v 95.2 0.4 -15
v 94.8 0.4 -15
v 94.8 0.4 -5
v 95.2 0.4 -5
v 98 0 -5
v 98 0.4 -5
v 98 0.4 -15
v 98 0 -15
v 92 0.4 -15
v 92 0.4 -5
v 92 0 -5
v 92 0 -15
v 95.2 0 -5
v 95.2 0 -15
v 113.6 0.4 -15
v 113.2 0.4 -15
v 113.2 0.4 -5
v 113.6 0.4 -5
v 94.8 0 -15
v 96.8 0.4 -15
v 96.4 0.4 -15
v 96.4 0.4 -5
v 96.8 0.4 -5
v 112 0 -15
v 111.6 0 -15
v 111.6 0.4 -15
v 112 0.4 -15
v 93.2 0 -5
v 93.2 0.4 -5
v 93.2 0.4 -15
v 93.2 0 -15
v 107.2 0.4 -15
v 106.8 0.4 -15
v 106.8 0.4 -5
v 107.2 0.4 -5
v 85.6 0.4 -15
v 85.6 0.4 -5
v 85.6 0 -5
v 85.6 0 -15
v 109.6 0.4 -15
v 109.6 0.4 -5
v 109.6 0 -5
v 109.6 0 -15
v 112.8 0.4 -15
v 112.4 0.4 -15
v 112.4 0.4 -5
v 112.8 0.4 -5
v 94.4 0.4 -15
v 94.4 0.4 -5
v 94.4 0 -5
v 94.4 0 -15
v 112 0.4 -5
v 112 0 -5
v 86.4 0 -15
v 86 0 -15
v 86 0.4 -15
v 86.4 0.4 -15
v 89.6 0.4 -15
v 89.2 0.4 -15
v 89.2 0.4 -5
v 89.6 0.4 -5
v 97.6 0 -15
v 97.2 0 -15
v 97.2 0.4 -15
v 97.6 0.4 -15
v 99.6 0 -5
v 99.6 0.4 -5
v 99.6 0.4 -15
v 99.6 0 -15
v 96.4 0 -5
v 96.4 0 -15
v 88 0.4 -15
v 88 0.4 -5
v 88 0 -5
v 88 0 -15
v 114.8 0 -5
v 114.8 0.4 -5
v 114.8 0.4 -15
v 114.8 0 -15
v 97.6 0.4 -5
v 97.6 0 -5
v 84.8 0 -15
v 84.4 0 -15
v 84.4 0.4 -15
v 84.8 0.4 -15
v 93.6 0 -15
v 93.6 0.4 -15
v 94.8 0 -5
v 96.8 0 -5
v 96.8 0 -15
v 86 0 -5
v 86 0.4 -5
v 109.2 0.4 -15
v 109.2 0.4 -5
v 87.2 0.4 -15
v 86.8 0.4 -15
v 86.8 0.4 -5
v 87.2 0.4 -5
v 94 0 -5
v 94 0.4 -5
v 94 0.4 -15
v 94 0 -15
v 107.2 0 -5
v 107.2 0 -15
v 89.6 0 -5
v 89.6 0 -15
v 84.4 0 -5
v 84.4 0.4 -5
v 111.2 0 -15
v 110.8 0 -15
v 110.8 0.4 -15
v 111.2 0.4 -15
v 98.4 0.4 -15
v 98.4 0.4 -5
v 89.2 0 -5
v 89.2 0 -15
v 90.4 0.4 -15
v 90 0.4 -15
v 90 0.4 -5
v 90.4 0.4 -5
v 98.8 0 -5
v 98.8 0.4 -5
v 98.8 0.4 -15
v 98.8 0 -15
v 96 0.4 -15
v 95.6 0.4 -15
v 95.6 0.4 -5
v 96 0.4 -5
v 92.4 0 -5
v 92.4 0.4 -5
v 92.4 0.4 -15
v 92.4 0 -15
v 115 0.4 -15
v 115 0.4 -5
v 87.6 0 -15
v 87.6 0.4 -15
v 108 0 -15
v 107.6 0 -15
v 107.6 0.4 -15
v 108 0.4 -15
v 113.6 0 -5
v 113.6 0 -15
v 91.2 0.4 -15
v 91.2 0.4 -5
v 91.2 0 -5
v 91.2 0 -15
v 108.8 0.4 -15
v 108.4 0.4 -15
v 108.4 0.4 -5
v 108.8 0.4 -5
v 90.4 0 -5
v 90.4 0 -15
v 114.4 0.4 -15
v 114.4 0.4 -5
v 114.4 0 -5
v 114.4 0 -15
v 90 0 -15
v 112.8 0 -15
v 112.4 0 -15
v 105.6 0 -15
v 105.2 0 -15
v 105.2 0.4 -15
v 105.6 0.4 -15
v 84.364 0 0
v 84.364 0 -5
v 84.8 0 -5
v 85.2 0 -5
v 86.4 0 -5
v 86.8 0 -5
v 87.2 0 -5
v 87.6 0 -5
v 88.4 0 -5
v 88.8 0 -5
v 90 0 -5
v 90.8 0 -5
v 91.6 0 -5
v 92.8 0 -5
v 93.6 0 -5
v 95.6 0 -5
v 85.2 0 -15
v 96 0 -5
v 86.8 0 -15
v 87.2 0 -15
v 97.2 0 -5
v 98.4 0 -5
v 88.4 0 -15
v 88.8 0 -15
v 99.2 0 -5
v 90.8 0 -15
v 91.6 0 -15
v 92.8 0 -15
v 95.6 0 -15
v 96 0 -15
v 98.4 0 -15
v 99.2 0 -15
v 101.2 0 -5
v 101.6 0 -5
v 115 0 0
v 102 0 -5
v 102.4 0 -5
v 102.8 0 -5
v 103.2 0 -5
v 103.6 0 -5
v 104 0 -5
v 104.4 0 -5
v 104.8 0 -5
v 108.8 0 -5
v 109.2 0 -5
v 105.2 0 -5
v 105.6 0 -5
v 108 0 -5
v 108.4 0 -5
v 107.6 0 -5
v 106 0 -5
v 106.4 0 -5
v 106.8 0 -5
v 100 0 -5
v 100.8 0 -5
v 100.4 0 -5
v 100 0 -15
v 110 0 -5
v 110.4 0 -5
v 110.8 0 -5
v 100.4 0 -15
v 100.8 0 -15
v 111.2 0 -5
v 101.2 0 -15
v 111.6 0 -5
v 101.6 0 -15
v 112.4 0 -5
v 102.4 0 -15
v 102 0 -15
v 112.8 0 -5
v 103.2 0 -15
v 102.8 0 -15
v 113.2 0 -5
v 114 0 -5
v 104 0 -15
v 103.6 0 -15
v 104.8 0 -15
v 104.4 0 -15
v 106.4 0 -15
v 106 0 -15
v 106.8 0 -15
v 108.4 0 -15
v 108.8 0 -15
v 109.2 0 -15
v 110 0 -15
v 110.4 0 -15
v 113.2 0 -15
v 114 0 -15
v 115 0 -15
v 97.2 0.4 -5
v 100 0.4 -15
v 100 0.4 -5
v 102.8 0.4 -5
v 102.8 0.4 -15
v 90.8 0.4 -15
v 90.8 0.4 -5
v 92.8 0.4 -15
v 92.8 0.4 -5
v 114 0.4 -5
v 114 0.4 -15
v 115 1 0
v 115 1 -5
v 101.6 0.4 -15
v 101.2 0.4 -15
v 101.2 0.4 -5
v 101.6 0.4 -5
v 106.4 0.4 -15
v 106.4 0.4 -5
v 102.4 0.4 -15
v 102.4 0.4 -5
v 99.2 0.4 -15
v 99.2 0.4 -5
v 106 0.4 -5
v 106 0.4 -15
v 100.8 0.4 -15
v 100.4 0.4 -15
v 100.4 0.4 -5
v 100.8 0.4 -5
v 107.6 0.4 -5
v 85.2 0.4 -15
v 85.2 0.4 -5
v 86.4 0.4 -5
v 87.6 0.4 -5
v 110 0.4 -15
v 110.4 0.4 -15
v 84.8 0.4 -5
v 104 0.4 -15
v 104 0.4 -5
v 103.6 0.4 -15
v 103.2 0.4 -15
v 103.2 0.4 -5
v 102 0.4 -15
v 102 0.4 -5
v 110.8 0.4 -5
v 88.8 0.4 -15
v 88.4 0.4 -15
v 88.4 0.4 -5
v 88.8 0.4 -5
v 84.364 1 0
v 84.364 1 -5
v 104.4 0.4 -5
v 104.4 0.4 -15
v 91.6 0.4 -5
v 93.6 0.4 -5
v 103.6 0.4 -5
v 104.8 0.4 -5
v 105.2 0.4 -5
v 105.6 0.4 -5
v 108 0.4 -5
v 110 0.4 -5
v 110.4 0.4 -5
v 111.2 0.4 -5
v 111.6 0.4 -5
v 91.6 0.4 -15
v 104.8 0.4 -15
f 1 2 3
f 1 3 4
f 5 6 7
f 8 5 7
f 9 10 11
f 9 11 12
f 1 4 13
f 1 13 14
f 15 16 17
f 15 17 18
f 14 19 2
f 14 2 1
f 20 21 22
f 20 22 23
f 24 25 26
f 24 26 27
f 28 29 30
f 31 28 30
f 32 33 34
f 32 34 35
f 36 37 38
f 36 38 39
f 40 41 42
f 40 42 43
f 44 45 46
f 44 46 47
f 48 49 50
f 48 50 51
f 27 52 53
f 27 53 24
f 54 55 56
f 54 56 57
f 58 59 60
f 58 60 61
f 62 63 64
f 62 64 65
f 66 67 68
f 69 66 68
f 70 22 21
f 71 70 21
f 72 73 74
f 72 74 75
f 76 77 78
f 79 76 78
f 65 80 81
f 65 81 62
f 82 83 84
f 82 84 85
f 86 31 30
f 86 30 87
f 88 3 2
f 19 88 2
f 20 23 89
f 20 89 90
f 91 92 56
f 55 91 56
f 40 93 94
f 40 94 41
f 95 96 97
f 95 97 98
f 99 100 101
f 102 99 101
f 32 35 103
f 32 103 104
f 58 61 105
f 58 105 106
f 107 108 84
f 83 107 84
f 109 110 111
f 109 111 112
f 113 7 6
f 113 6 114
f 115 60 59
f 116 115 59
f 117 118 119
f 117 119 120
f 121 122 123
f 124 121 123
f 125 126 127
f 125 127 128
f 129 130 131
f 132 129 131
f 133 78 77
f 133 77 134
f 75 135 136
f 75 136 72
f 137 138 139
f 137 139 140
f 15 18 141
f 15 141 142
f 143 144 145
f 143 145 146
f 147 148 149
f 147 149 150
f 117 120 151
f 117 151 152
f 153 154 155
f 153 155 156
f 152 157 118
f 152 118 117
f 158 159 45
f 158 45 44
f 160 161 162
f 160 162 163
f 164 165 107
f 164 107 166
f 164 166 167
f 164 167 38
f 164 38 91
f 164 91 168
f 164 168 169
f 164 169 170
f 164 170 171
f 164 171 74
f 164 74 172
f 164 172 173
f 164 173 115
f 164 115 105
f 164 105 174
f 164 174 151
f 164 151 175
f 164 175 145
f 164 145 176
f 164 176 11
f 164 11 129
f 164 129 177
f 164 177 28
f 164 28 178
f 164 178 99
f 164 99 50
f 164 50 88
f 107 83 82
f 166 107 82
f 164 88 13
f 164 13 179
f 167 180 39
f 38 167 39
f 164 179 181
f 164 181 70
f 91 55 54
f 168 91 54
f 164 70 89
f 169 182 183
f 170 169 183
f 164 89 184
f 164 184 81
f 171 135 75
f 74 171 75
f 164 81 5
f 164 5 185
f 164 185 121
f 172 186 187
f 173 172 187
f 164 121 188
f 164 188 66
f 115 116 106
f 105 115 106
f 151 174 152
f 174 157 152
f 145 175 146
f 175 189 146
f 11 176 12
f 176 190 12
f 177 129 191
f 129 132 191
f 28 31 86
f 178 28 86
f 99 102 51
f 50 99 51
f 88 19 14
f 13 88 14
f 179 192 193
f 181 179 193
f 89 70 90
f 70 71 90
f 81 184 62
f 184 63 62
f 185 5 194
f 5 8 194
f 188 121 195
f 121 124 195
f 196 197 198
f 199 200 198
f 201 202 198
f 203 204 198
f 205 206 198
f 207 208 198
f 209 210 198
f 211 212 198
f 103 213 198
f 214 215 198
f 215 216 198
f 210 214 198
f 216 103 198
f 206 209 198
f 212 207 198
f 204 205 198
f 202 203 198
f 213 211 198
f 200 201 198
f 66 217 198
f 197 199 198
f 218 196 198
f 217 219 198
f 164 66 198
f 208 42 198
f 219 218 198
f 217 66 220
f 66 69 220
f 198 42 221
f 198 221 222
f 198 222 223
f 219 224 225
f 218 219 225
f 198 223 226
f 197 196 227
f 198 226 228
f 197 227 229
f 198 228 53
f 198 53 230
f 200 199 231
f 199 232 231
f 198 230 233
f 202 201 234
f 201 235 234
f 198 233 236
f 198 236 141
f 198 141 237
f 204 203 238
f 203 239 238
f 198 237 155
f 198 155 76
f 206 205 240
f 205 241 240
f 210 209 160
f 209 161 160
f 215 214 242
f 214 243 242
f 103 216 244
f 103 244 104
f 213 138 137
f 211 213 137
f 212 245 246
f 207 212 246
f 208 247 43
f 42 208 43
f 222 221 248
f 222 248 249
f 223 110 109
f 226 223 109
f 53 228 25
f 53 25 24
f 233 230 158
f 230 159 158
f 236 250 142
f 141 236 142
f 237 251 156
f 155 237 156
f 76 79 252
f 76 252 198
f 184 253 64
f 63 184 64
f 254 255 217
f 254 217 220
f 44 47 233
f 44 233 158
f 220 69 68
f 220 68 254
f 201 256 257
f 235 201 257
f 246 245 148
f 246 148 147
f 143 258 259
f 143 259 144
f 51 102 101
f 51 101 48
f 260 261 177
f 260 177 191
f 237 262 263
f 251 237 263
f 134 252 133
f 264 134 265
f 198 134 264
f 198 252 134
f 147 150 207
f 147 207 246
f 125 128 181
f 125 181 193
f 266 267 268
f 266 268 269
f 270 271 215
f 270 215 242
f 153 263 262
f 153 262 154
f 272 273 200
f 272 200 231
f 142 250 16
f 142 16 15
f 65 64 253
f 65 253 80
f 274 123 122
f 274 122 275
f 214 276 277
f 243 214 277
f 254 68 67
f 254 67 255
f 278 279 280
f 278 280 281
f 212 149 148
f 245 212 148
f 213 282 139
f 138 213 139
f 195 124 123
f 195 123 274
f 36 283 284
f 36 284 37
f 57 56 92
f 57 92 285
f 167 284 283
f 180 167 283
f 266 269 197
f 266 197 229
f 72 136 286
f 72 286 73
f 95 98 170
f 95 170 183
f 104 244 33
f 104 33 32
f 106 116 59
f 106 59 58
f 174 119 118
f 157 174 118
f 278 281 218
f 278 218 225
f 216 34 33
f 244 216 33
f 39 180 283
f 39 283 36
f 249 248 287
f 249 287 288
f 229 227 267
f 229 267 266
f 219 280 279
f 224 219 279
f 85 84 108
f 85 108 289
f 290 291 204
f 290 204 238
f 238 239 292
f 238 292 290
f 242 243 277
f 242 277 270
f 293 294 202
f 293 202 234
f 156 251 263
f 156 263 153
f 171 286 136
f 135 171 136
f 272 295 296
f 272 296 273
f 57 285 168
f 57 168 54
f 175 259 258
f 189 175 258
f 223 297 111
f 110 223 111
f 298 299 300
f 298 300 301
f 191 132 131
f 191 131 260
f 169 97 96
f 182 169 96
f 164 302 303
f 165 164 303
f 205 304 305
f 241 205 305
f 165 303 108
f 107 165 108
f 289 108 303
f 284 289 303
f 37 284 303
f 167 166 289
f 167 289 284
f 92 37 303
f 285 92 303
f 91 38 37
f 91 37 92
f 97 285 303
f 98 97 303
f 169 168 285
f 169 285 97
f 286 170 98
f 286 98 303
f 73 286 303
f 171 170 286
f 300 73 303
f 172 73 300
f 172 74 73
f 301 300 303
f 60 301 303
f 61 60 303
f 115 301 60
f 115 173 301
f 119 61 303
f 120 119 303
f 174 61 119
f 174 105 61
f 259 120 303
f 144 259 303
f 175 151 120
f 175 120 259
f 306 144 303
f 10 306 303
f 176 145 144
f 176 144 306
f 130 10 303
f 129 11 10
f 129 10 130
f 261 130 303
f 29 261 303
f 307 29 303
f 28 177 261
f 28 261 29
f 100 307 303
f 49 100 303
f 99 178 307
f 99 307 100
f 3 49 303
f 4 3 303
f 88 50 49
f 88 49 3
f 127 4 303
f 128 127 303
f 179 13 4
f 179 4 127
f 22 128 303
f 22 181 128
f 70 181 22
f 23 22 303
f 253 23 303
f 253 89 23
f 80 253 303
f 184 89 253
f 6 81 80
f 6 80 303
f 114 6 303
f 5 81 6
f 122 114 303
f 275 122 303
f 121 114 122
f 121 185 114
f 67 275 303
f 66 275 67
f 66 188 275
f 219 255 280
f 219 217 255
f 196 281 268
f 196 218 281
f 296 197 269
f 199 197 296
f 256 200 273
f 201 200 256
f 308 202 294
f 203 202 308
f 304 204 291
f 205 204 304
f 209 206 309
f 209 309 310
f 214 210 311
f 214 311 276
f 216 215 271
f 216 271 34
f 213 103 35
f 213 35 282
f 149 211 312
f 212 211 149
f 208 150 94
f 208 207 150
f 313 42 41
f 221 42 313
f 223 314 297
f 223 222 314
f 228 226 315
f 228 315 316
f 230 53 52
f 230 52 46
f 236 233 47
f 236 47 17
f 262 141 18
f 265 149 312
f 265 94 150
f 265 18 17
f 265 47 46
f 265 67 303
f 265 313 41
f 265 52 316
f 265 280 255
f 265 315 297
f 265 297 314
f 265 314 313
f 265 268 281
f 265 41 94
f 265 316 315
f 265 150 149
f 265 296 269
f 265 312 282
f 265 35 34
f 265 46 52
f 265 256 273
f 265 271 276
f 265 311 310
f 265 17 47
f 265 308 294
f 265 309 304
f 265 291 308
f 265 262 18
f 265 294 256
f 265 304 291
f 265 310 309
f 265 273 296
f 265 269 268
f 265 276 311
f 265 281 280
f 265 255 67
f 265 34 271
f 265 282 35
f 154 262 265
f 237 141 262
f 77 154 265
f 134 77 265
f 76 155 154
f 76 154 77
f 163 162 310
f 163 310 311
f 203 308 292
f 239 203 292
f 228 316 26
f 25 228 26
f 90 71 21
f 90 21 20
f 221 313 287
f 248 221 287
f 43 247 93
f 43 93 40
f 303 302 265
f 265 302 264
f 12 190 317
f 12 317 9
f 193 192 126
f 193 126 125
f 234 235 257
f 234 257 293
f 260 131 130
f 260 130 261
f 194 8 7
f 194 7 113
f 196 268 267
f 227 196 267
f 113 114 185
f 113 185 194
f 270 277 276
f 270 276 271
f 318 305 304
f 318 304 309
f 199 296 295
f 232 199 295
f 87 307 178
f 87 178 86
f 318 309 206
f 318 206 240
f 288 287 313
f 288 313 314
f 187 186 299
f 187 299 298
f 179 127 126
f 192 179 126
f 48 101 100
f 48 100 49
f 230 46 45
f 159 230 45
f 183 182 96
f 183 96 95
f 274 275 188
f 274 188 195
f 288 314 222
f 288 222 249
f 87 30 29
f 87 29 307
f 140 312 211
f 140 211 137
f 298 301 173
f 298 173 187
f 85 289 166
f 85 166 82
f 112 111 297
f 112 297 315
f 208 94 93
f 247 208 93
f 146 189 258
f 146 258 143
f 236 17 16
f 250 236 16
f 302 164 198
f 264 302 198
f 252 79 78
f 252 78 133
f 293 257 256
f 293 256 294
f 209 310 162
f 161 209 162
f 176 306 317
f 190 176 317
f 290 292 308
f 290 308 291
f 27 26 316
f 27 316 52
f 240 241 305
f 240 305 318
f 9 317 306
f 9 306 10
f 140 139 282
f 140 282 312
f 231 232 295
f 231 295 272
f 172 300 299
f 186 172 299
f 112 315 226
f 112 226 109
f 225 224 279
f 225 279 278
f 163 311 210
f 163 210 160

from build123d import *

# Parameters (mm, degrees)
SKETCH1_W           = 115
SKETCH1_H           = 15
BOSS_EXTRUDE1_DEPTH = 0.5
SKETCH2_W           = 115
SKETCH2_H           = 10
CUT_EXTRUDE1_DEPTH  = 0.1
SKETCH3_W           = 0.4
SKETCH3_H           = 10
CUT_EXTRUDE2_DEPTH  = 0.4
LPATTERN3_COUNT     = 150
LPATTERN3_PITCH     = 0.8
SKETCH4_W           = 115
SKETCH4_H           = 5
BOSS_EXTRUDE2_DEPTH = 1
SKETCH5_W           = 77.289086501
SKETCH5_H           = 15.822063322
CUT_EXTRUDE3_DEPTH  = 1
SKETCH6_W           = 3.197112069
SKETCH6_H           = 15.066627115
CUT_EXTRUDE4_DEPTH  = 1
SKETCH7_W           = 3.877656405
SKETCH7_H           = 15.126214191
CUT_EXTRUDE7_DEPTH  = 1


with BuildPart() as part:
    # Sketch1 → Boss-Extrude1 (new body)
    with BuildSketch(Plane(origin=(0, 0, 0), x_dir=(1, 0, 0), z_dir=(0, 1, 0))):
        with Locations((57.5, 7.5)):
            Rectangle(SKETCH1_W, SKETCH1_H)
    extrude(amount=BOSS_EXTRUDE1_DEPTH)

    # Sketch2 → Cut-Extrude1 (cut)
    with BuildSketch(Plane(origin=(0, 0.5, 0), x_dir=(1, 0, 0), z_dir=(0, 1, 0))):
        with Locations((57.5, 10)):
            Rectangle(SKETCH2_W, SKETCH2_H)
    extrude(amount=-CUT_EXTRUDE1_DEPTH, mode=Mode.SUBTRACT)

    # Sketch3 → Cut-Extrude2 (cut)
    with BuildSketch(Plane(origin=(0, 0.4, 0), x_dir=(1, 0, 0), z_dir=(0, 1, 0))):
        with Locations((0.2, 10)):
            Rectangle(SKETCH3_W, SKETCH3_H)
    cut_extrude2 = extrude(amount=-CUT_EXTRUDE2_DEPTH, mode=Mode.SUBTRACT)

    # LPattern3: Cut-Extrude2 ×150
    with Locations(*[(i * LPATTERN3_PITCH, 0, 0) for i in range(1, LPATTERN3_COUNT)]):
        add(cut_extrude2, mode=Mode.SUBTRACT)

    # Sketch4 → Boss-Extrude2 (add)
    with BuildSketch(Plane.XZ):
        with Locations((57.5, -2.5)):
            Rectangle(SKETCH4_W, SKETCH4_H)
    extrude(amount=-BOSS_EXTRUDE2_DEPTH)

    # Sketch5 → Cut-Extrude3 (cut)
    with BuildSketch(Plane(origin=(0, 1, 0), x_dir=(1, 0, 0), z_dir=(0, 1, 0))):
        with Locations((38.64454325, 7.911031661)):
            Rectangle(SKETCH5_W, SKETCH5_H)
    extrude(amount=-CUT_EXTRUDE3_DEPTH, mode=Mode.SUBTRACT)

    # Sketch6 → Cut-Extrude4 (cut)
    with BuildSketch(Plane(origin=(0, 1, 0), x_dir=(1, 0, 0), z_dir=(0, 1, 0))):
        with Locations((78.887642535, 7.533313558)):
            Rectangle(SKETCH6_W, SKETCH6_H)
    extrude(amount=-CUT_EXTRUDE4_DEPTH, mode=Mode.SUBTRACT)

    # Sketch7 → Cut-Extrude7 (cut)
    with BuildSketch(Plane(origin=(0, 1, 0), x_dir=(1, 0, 0), z_dir=(0, 1, 0))):
        with Locations((82.425026773, 7.563107096)):
            Rectangle(SKETCH7_W, SKETCH7_H)
    extrude(amount=-CUT_EXTRUDE7_DEPTH, mode=Mode.SUBTRACT)


solid = part.part
